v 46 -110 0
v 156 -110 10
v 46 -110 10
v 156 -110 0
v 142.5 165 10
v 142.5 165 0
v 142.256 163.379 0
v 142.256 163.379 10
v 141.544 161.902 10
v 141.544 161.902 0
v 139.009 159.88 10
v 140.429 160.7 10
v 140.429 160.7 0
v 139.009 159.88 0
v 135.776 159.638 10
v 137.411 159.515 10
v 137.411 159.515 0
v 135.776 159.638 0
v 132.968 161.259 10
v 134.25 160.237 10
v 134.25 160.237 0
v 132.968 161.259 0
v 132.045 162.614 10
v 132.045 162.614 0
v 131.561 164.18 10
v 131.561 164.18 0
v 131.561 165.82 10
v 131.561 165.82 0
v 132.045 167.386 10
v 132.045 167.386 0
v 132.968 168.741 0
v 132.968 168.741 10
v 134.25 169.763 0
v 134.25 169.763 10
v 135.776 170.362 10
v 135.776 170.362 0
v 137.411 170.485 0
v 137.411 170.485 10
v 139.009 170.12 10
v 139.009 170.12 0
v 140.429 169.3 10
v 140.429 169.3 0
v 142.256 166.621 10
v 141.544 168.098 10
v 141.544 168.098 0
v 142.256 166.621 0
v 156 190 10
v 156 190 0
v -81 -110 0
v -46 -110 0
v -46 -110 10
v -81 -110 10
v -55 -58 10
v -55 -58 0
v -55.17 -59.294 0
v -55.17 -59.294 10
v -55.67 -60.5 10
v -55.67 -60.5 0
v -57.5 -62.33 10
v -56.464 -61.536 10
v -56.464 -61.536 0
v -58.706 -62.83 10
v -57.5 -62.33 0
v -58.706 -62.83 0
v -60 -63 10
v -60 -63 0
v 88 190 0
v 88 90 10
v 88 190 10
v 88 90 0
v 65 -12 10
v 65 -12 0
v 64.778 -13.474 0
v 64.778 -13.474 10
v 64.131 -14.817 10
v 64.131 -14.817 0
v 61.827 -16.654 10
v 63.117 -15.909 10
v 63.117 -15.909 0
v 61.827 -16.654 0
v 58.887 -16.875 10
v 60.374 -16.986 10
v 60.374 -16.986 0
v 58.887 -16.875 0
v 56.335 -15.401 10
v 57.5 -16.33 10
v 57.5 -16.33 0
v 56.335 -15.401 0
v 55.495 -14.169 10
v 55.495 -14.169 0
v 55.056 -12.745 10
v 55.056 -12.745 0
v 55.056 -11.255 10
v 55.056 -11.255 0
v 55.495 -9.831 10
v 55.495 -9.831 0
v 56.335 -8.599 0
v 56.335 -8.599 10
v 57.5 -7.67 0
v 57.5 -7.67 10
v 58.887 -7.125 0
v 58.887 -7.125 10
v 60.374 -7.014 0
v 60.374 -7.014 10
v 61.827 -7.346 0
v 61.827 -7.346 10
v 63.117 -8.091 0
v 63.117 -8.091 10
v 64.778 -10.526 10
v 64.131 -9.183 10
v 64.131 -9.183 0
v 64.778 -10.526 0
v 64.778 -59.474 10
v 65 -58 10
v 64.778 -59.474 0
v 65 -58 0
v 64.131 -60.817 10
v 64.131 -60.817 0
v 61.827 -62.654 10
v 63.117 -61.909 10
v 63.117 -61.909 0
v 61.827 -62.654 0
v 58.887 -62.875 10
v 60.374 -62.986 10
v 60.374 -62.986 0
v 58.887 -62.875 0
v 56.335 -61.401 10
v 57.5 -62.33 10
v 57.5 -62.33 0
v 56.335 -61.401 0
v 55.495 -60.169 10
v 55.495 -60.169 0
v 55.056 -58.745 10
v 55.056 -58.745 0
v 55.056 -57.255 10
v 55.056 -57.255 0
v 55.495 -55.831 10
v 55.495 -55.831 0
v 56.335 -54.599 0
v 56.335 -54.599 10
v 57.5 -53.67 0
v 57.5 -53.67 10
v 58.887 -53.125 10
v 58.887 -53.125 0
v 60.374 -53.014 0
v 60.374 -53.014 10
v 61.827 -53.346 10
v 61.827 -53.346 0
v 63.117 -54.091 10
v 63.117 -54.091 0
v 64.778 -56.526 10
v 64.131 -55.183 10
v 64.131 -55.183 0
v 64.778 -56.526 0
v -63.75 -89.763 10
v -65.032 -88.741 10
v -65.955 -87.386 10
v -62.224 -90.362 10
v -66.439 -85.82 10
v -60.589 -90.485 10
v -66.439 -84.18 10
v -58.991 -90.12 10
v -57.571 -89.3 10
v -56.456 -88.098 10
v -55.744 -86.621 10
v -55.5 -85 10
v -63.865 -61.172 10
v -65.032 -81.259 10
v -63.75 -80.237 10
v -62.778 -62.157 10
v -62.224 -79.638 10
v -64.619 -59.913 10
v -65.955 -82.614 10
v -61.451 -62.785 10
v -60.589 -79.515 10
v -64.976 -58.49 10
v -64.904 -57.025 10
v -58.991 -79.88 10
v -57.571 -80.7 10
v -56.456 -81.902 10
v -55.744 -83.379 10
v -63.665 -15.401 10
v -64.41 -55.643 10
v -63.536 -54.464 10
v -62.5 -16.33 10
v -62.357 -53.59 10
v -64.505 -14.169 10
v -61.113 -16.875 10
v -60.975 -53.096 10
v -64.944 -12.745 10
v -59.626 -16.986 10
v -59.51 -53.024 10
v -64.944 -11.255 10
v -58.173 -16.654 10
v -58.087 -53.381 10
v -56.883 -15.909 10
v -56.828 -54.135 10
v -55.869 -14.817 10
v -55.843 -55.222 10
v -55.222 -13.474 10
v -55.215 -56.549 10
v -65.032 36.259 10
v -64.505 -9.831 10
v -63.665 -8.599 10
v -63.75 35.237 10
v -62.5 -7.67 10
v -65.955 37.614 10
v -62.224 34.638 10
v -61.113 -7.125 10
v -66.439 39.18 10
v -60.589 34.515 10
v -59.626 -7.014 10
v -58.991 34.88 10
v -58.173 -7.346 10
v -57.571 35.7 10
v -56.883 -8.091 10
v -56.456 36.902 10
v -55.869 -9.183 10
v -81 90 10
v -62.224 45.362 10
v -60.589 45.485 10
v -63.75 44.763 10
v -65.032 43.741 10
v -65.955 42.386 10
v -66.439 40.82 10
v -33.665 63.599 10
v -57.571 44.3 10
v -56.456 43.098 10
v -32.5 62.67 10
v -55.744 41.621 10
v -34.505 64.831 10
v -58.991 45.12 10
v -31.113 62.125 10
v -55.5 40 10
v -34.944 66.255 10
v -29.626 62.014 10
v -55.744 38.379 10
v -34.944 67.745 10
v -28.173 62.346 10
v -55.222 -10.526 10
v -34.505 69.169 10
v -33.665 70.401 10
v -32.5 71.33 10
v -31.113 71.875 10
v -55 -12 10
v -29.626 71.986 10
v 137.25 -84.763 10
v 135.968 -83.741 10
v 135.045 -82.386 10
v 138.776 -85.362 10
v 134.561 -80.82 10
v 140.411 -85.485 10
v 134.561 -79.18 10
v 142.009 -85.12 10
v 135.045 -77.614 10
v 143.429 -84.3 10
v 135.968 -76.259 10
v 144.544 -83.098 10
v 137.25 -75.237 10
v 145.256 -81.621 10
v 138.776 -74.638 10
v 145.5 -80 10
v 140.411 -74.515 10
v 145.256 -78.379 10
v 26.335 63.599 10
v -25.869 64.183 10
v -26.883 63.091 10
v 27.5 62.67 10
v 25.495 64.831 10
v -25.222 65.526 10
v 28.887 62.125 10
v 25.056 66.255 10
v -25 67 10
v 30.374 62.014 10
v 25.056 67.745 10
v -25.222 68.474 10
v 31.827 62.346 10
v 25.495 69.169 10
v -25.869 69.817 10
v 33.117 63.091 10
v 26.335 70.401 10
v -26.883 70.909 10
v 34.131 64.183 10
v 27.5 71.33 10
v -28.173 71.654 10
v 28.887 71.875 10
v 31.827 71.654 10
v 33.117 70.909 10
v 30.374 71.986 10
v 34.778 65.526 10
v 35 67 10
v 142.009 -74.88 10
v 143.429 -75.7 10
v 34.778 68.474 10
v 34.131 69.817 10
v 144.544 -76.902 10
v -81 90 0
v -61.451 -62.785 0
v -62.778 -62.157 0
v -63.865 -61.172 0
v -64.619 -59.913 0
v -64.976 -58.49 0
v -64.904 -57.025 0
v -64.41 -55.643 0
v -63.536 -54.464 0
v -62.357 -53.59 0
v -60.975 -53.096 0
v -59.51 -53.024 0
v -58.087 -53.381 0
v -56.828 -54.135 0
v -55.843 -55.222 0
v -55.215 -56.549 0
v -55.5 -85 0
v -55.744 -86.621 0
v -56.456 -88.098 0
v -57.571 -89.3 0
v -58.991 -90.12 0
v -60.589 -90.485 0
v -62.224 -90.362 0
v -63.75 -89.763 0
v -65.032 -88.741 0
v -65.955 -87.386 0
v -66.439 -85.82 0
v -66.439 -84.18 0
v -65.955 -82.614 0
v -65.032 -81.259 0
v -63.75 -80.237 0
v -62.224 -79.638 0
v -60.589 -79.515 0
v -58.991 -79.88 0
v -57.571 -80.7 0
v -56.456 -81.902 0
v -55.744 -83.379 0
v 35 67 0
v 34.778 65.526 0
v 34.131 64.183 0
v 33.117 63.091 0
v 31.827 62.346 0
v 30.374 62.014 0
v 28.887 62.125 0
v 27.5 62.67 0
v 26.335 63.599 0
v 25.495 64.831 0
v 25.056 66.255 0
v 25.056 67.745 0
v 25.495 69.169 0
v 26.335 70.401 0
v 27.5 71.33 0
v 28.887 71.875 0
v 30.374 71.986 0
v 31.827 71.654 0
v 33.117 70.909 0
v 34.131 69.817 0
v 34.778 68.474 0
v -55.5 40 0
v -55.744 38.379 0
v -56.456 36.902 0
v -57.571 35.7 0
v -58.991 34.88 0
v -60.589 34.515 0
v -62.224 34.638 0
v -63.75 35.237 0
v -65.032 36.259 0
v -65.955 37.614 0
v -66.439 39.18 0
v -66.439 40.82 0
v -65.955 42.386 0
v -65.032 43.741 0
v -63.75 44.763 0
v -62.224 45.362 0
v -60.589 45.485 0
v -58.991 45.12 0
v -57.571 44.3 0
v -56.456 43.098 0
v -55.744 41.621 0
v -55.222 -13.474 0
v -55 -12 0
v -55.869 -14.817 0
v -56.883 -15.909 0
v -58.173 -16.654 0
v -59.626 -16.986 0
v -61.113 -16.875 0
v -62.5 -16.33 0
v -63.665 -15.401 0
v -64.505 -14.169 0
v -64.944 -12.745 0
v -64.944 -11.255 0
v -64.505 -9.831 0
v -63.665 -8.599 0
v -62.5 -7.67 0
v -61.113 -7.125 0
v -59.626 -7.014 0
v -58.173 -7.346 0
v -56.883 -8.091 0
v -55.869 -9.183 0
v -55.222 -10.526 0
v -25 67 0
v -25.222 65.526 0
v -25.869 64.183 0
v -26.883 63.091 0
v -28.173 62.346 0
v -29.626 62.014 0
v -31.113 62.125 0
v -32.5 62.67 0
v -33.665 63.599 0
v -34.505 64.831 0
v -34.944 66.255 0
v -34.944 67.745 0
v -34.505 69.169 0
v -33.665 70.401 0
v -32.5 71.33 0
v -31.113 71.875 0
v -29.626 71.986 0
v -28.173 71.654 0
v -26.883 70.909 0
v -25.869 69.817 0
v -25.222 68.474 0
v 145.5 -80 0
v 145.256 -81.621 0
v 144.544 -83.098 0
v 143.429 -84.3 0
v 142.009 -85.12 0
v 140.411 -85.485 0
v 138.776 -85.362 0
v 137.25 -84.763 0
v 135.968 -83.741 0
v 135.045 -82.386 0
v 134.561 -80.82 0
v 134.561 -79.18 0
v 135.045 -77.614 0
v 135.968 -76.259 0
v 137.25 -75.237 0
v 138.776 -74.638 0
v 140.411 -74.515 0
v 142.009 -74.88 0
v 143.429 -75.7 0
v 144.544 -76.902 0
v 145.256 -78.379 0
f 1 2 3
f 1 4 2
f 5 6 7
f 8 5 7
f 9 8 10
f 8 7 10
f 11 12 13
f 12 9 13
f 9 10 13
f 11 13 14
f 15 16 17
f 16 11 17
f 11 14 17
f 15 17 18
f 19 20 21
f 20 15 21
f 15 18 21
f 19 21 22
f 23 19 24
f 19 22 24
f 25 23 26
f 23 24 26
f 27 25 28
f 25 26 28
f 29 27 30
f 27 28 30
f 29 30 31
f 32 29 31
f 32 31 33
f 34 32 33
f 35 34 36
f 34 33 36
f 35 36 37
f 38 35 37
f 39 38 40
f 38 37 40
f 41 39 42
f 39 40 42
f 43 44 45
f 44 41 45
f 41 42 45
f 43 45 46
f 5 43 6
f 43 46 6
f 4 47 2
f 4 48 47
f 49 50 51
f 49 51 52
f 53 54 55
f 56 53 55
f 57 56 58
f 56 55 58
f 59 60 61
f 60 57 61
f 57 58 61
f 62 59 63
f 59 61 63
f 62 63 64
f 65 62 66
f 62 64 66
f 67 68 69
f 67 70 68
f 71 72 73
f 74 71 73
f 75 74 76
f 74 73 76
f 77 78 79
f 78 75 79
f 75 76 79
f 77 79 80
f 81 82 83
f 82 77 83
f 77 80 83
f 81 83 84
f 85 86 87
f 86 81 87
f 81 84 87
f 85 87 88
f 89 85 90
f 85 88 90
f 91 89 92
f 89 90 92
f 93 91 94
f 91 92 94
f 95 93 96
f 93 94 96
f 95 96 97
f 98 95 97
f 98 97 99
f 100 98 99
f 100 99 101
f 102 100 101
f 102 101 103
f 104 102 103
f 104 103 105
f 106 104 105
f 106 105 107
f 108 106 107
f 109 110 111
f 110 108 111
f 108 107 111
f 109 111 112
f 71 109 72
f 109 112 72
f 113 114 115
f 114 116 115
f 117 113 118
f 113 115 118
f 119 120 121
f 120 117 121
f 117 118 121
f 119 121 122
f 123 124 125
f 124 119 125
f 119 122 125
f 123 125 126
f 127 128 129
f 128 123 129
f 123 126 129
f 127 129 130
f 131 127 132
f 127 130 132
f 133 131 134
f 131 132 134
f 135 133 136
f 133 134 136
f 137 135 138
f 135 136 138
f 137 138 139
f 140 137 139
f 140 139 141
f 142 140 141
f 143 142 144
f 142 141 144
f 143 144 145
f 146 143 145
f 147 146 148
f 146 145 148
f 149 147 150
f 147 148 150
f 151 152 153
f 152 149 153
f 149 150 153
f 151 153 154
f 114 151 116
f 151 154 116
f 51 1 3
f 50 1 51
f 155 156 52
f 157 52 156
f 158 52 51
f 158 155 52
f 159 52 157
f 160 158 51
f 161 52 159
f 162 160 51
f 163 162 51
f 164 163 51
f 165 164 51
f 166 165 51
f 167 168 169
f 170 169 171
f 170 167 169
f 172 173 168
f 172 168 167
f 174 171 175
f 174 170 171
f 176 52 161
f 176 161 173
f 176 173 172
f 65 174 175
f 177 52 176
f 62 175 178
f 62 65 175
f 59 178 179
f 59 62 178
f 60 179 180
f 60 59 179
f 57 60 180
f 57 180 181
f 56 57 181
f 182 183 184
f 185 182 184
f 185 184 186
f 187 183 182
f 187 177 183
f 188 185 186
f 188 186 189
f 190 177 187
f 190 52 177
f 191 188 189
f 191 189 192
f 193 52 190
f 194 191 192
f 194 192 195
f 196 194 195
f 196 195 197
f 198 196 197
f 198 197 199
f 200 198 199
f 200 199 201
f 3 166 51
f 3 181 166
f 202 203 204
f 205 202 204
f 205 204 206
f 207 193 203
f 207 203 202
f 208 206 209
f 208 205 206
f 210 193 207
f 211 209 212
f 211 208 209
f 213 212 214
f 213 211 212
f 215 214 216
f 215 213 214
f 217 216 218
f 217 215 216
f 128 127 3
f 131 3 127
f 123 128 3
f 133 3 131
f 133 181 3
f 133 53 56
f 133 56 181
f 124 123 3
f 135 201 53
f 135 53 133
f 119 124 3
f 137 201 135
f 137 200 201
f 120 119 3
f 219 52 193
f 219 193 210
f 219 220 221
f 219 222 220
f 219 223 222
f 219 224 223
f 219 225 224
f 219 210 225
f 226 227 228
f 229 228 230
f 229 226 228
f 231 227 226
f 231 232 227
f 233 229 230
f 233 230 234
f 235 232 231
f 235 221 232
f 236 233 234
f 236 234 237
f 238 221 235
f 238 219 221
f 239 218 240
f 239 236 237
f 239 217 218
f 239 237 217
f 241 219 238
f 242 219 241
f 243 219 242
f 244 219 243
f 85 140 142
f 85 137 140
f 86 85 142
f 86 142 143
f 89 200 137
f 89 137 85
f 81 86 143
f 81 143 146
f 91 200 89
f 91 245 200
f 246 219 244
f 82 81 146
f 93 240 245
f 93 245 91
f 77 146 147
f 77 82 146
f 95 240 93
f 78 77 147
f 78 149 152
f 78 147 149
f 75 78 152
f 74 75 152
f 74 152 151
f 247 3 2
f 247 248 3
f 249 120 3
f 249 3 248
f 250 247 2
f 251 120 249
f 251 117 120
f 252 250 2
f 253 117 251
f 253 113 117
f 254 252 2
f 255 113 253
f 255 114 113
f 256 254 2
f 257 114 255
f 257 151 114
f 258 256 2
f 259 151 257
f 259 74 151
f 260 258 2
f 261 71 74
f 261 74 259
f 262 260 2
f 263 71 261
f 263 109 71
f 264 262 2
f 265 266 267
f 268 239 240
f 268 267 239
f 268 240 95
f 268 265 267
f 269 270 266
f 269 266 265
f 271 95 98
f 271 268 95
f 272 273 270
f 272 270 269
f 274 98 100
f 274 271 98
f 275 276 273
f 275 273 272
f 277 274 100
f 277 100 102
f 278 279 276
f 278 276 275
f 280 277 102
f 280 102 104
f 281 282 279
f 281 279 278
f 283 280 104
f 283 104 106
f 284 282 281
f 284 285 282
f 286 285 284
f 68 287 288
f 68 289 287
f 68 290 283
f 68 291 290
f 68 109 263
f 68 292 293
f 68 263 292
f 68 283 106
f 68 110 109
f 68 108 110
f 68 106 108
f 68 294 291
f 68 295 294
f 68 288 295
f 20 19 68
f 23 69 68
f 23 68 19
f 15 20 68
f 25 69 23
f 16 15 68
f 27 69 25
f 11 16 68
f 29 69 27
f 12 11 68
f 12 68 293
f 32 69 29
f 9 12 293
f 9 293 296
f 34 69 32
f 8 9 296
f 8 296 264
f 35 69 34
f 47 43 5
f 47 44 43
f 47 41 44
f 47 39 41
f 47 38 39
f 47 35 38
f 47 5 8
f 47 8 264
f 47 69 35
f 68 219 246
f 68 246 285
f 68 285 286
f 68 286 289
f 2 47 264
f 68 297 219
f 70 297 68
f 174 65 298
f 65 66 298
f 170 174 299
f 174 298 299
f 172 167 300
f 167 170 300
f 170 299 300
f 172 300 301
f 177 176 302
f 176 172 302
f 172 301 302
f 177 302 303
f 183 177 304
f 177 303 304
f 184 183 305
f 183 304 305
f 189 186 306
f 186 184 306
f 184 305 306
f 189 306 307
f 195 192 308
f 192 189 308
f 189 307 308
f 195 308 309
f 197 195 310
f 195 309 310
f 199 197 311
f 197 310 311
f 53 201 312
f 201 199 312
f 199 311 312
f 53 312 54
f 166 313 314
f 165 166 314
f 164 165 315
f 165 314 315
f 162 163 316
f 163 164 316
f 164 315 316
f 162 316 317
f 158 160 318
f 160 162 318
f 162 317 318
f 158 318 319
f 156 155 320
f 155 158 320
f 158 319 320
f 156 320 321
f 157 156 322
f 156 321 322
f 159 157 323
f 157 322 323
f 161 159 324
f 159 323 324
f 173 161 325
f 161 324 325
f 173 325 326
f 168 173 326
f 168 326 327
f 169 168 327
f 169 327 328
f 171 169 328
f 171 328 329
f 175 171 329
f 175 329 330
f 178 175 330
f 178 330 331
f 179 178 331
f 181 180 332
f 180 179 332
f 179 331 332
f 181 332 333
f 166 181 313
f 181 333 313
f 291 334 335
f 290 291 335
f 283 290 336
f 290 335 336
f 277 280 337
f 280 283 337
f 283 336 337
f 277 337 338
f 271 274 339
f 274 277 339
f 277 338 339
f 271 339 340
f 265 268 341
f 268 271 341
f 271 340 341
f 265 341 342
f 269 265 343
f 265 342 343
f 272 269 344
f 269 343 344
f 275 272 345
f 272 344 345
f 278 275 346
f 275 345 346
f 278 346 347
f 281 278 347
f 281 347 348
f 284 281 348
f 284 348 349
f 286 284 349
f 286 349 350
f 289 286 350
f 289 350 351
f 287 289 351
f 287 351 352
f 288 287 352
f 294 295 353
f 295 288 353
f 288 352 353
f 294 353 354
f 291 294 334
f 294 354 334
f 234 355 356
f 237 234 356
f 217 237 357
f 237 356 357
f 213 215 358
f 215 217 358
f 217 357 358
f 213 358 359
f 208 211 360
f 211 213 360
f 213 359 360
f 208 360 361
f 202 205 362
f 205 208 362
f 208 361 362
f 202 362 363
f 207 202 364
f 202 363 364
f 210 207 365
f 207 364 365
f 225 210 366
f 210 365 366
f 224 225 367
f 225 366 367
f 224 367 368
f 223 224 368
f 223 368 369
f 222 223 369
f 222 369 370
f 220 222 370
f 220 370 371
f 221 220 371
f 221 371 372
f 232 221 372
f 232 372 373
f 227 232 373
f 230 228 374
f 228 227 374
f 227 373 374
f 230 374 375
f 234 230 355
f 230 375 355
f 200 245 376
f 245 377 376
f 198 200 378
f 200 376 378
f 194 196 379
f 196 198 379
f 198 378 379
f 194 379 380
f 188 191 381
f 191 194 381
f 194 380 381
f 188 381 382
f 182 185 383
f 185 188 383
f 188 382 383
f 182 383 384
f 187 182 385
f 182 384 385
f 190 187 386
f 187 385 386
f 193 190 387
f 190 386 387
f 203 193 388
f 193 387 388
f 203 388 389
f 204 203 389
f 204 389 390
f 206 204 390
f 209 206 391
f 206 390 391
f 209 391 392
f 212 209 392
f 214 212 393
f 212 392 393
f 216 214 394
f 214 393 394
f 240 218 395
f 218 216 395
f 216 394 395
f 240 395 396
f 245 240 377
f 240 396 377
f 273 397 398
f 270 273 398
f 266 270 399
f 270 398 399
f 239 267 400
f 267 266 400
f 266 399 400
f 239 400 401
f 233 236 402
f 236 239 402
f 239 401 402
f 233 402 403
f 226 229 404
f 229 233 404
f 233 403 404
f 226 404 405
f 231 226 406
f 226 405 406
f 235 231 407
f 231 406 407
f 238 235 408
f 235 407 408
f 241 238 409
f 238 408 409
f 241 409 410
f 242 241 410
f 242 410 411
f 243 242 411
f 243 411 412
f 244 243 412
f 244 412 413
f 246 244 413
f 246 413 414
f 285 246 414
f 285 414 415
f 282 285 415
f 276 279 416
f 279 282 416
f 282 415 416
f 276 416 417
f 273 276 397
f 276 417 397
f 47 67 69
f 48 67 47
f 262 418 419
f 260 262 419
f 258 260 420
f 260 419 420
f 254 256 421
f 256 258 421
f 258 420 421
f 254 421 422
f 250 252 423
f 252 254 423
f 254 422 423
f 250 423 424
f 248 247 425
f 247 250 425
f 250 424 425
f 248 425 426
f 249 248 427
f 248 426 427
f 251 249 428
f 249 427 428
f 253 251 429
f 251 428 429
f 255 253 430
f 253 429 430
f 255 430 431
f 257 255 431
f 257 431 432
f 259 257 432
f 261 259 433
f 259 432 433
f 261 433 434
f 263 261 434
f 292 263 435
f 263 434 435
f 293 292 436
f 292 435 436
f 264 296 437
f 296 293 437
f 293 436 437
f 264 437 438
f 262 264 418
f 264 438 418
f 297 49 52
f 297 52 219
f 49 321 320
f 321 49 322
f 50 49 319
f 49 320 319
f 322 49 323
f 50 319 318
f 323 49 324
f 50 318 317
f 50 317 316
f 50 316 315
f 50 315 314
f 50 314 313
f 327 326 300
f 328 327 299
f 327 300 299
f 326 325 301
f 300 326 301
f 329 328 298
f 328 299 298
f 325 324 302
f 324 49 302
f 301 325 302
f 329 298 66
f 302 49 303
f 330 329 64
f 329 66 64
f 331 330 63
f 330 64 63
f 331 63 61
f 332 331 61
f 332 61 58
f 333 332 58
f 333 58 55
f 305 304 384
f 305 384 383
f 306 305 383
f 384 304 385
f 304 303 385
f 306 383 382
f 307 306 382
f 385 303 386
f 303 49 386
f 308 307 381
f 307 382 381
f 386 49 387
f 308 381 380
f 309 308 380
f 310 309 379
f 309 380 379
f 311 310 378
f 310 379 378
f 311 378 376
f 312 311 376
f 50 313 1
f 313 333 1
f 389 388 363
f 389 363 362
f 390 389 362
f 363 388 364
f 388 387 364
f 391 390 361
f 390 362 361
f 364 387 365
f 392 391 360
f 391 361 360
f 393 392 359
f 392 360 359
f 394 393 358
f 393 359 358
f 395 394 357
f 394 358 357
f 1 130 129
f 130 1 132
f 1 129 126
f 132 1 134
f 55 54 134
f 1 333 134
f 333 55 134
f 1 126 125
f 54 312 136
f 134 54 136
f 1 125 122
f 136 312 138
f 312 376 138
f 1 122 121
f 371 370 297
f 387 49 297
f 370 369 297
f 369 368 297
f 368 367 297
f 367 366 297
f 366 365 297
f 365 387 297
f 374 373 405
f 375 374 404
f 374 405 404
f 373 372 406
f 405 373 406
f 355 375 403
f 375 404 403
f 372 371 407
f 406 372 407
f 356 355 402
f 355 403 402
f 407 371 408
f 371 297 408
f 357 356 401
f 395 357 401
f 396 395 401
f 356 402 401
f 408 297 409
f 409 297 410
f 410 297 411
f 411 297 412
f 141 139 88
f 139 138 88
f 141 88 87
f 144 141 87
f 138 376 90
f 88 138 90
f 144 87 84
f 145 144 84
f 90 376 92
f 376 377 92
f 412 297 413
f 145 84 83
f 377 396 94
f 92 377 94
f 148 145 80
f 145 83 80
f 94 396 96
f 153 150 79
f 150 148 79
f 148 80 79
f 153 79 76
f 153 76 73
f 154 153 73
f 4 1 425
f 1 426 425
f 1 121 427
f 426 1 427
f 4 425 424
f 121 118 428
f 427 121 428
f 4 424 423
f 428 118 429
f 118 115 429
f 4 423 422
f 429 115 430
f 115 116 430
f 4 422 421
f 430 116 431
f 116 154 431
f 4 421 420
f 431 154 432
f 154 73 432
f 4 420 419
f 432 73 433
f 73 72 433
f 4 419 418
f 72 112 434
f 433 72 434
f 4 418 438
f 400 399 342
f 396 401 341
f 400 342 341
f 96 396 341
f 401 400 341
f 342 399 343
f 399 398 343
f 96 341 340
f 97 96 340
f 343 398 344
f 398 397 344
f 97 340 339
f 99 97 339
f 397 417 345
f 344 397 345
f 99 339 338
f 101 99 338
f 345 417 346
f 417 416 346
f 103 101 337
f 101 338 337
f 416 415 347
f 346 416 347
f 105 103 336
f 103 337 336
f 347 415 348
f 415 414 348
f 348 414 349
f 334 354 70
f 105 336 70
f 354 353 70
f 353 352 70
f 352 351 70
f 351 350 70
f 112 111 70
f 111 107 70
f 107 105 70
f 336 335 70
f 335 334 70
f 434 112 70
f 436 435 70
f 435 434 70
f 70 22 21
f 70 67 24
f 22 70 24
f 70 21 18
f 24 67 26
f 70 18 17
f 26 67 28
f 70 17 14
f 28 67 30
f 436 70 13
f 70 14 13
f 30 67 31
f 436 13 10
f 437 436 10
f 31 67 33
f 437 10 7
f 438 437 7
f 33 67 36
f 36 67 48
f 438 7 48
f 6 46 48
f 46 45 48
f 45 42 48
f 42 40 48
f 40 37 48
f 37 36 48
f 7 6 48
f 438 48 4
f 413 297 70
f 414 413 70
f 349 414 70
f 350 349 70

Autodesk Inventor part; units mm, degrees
ref_plane "YZ Plane" through (0, 0, 0) normal (1, 0, 0) x (0, 1, 0)
ref_plane "XZ Plane" through (0, 0, 0) normal (0, 1, 0) x (-1, 0, 0)
ref_plane "XY Plane" through (0, 0, 0) normal (0, 0, 1) x (1, 0, 0)
sketch "Sketch1" plane through (0, 0, 0) normal (0, 0, 1) x (1, 0, 0)
  circle A0 centre (60, -12) radius 5
  line L0 (0, 0) -> (0, 90) construction
  circle A1 centre (-60, -12) radius 5
  line L1 (46, -110) -> (-46, -110)
  line L2 (-46, -110) -> (-46, -110)
  line L3 (-46, -110) -> (-81, -110)
  line L4 (-81, 90) -> (88, 90)
  line L5 (88, 90) -> (88, 190)
  line L6 (88, 190) -> (156, 190)
  line L7 (156, 190) -> (156, -110)
  line L8 (156, -110) -> (46, -110)
  line L9 (46, -110) -> (46, -110)
  line L10 (-81, -110) -> (-81, 90)
  circle A2 centre (30, 67) radius 5
  circle A3 centre (-30, 67) radius 5
  circle A4 centre (60, -58) radius 5
  circle A5 centre (-60, -58) radius 5
  circle A6 centre (-61, -85) radius 5.5
  circle A7 centre (140, -80) radius 5.5
  circle A8 centre (137, 165) radius 5.5
  circle A9 centre (-61, 40) radius 5.5
  line L11 (-60, -58) -> (-60, -78)
  point P0 (0, -110)
  dimension "d82" = 10
  dimension "d83" = 60
  dimension "d86" = 110
  dimension "d87" = 90
  dimension "d88" = 92
  dimension "d90" = 300
  dimension "d91" = 200
  dimension "d92" = 35
  dimension "d93" = 68
  dimension "d94" = 100
  dimension "d95" = 237
  dimension "d96" = 79
  dimension "d98" = 60
  dimension "d100" = 46
  dimension "d101" = 11
  dimension "d102" = 140
  dimension "d103" = 80
  dimension "d104" = 3
  dimension "d105" = 165
  dimension "d106" = 61
  dimension "d107" = 85
  dimension "d108" = 40
  dimension "d136" = 12
  dimension "d139" = 20
extrude "Extrusion1" add sketch "Sketch1" along normal blind 10
thread "Thread1" size "M10x1.5" class "6H" standard "ISO Metric profile" full length
thread "Thread2" size "M10x1.5" class "6H" standard "ANSI Metric M Profile" full length
thread "Thread3" size "M10x1.5" class "6H" standard "ANSI Metric M Profile" full length
thread "Thread4" size "M10x1.5" class "6H" standard "ANSI Metric M Profile" full length
properties part number "SUPPORT MAIN FRAME MOTOR-BALL SCREW-REV-B" material "Steel"
